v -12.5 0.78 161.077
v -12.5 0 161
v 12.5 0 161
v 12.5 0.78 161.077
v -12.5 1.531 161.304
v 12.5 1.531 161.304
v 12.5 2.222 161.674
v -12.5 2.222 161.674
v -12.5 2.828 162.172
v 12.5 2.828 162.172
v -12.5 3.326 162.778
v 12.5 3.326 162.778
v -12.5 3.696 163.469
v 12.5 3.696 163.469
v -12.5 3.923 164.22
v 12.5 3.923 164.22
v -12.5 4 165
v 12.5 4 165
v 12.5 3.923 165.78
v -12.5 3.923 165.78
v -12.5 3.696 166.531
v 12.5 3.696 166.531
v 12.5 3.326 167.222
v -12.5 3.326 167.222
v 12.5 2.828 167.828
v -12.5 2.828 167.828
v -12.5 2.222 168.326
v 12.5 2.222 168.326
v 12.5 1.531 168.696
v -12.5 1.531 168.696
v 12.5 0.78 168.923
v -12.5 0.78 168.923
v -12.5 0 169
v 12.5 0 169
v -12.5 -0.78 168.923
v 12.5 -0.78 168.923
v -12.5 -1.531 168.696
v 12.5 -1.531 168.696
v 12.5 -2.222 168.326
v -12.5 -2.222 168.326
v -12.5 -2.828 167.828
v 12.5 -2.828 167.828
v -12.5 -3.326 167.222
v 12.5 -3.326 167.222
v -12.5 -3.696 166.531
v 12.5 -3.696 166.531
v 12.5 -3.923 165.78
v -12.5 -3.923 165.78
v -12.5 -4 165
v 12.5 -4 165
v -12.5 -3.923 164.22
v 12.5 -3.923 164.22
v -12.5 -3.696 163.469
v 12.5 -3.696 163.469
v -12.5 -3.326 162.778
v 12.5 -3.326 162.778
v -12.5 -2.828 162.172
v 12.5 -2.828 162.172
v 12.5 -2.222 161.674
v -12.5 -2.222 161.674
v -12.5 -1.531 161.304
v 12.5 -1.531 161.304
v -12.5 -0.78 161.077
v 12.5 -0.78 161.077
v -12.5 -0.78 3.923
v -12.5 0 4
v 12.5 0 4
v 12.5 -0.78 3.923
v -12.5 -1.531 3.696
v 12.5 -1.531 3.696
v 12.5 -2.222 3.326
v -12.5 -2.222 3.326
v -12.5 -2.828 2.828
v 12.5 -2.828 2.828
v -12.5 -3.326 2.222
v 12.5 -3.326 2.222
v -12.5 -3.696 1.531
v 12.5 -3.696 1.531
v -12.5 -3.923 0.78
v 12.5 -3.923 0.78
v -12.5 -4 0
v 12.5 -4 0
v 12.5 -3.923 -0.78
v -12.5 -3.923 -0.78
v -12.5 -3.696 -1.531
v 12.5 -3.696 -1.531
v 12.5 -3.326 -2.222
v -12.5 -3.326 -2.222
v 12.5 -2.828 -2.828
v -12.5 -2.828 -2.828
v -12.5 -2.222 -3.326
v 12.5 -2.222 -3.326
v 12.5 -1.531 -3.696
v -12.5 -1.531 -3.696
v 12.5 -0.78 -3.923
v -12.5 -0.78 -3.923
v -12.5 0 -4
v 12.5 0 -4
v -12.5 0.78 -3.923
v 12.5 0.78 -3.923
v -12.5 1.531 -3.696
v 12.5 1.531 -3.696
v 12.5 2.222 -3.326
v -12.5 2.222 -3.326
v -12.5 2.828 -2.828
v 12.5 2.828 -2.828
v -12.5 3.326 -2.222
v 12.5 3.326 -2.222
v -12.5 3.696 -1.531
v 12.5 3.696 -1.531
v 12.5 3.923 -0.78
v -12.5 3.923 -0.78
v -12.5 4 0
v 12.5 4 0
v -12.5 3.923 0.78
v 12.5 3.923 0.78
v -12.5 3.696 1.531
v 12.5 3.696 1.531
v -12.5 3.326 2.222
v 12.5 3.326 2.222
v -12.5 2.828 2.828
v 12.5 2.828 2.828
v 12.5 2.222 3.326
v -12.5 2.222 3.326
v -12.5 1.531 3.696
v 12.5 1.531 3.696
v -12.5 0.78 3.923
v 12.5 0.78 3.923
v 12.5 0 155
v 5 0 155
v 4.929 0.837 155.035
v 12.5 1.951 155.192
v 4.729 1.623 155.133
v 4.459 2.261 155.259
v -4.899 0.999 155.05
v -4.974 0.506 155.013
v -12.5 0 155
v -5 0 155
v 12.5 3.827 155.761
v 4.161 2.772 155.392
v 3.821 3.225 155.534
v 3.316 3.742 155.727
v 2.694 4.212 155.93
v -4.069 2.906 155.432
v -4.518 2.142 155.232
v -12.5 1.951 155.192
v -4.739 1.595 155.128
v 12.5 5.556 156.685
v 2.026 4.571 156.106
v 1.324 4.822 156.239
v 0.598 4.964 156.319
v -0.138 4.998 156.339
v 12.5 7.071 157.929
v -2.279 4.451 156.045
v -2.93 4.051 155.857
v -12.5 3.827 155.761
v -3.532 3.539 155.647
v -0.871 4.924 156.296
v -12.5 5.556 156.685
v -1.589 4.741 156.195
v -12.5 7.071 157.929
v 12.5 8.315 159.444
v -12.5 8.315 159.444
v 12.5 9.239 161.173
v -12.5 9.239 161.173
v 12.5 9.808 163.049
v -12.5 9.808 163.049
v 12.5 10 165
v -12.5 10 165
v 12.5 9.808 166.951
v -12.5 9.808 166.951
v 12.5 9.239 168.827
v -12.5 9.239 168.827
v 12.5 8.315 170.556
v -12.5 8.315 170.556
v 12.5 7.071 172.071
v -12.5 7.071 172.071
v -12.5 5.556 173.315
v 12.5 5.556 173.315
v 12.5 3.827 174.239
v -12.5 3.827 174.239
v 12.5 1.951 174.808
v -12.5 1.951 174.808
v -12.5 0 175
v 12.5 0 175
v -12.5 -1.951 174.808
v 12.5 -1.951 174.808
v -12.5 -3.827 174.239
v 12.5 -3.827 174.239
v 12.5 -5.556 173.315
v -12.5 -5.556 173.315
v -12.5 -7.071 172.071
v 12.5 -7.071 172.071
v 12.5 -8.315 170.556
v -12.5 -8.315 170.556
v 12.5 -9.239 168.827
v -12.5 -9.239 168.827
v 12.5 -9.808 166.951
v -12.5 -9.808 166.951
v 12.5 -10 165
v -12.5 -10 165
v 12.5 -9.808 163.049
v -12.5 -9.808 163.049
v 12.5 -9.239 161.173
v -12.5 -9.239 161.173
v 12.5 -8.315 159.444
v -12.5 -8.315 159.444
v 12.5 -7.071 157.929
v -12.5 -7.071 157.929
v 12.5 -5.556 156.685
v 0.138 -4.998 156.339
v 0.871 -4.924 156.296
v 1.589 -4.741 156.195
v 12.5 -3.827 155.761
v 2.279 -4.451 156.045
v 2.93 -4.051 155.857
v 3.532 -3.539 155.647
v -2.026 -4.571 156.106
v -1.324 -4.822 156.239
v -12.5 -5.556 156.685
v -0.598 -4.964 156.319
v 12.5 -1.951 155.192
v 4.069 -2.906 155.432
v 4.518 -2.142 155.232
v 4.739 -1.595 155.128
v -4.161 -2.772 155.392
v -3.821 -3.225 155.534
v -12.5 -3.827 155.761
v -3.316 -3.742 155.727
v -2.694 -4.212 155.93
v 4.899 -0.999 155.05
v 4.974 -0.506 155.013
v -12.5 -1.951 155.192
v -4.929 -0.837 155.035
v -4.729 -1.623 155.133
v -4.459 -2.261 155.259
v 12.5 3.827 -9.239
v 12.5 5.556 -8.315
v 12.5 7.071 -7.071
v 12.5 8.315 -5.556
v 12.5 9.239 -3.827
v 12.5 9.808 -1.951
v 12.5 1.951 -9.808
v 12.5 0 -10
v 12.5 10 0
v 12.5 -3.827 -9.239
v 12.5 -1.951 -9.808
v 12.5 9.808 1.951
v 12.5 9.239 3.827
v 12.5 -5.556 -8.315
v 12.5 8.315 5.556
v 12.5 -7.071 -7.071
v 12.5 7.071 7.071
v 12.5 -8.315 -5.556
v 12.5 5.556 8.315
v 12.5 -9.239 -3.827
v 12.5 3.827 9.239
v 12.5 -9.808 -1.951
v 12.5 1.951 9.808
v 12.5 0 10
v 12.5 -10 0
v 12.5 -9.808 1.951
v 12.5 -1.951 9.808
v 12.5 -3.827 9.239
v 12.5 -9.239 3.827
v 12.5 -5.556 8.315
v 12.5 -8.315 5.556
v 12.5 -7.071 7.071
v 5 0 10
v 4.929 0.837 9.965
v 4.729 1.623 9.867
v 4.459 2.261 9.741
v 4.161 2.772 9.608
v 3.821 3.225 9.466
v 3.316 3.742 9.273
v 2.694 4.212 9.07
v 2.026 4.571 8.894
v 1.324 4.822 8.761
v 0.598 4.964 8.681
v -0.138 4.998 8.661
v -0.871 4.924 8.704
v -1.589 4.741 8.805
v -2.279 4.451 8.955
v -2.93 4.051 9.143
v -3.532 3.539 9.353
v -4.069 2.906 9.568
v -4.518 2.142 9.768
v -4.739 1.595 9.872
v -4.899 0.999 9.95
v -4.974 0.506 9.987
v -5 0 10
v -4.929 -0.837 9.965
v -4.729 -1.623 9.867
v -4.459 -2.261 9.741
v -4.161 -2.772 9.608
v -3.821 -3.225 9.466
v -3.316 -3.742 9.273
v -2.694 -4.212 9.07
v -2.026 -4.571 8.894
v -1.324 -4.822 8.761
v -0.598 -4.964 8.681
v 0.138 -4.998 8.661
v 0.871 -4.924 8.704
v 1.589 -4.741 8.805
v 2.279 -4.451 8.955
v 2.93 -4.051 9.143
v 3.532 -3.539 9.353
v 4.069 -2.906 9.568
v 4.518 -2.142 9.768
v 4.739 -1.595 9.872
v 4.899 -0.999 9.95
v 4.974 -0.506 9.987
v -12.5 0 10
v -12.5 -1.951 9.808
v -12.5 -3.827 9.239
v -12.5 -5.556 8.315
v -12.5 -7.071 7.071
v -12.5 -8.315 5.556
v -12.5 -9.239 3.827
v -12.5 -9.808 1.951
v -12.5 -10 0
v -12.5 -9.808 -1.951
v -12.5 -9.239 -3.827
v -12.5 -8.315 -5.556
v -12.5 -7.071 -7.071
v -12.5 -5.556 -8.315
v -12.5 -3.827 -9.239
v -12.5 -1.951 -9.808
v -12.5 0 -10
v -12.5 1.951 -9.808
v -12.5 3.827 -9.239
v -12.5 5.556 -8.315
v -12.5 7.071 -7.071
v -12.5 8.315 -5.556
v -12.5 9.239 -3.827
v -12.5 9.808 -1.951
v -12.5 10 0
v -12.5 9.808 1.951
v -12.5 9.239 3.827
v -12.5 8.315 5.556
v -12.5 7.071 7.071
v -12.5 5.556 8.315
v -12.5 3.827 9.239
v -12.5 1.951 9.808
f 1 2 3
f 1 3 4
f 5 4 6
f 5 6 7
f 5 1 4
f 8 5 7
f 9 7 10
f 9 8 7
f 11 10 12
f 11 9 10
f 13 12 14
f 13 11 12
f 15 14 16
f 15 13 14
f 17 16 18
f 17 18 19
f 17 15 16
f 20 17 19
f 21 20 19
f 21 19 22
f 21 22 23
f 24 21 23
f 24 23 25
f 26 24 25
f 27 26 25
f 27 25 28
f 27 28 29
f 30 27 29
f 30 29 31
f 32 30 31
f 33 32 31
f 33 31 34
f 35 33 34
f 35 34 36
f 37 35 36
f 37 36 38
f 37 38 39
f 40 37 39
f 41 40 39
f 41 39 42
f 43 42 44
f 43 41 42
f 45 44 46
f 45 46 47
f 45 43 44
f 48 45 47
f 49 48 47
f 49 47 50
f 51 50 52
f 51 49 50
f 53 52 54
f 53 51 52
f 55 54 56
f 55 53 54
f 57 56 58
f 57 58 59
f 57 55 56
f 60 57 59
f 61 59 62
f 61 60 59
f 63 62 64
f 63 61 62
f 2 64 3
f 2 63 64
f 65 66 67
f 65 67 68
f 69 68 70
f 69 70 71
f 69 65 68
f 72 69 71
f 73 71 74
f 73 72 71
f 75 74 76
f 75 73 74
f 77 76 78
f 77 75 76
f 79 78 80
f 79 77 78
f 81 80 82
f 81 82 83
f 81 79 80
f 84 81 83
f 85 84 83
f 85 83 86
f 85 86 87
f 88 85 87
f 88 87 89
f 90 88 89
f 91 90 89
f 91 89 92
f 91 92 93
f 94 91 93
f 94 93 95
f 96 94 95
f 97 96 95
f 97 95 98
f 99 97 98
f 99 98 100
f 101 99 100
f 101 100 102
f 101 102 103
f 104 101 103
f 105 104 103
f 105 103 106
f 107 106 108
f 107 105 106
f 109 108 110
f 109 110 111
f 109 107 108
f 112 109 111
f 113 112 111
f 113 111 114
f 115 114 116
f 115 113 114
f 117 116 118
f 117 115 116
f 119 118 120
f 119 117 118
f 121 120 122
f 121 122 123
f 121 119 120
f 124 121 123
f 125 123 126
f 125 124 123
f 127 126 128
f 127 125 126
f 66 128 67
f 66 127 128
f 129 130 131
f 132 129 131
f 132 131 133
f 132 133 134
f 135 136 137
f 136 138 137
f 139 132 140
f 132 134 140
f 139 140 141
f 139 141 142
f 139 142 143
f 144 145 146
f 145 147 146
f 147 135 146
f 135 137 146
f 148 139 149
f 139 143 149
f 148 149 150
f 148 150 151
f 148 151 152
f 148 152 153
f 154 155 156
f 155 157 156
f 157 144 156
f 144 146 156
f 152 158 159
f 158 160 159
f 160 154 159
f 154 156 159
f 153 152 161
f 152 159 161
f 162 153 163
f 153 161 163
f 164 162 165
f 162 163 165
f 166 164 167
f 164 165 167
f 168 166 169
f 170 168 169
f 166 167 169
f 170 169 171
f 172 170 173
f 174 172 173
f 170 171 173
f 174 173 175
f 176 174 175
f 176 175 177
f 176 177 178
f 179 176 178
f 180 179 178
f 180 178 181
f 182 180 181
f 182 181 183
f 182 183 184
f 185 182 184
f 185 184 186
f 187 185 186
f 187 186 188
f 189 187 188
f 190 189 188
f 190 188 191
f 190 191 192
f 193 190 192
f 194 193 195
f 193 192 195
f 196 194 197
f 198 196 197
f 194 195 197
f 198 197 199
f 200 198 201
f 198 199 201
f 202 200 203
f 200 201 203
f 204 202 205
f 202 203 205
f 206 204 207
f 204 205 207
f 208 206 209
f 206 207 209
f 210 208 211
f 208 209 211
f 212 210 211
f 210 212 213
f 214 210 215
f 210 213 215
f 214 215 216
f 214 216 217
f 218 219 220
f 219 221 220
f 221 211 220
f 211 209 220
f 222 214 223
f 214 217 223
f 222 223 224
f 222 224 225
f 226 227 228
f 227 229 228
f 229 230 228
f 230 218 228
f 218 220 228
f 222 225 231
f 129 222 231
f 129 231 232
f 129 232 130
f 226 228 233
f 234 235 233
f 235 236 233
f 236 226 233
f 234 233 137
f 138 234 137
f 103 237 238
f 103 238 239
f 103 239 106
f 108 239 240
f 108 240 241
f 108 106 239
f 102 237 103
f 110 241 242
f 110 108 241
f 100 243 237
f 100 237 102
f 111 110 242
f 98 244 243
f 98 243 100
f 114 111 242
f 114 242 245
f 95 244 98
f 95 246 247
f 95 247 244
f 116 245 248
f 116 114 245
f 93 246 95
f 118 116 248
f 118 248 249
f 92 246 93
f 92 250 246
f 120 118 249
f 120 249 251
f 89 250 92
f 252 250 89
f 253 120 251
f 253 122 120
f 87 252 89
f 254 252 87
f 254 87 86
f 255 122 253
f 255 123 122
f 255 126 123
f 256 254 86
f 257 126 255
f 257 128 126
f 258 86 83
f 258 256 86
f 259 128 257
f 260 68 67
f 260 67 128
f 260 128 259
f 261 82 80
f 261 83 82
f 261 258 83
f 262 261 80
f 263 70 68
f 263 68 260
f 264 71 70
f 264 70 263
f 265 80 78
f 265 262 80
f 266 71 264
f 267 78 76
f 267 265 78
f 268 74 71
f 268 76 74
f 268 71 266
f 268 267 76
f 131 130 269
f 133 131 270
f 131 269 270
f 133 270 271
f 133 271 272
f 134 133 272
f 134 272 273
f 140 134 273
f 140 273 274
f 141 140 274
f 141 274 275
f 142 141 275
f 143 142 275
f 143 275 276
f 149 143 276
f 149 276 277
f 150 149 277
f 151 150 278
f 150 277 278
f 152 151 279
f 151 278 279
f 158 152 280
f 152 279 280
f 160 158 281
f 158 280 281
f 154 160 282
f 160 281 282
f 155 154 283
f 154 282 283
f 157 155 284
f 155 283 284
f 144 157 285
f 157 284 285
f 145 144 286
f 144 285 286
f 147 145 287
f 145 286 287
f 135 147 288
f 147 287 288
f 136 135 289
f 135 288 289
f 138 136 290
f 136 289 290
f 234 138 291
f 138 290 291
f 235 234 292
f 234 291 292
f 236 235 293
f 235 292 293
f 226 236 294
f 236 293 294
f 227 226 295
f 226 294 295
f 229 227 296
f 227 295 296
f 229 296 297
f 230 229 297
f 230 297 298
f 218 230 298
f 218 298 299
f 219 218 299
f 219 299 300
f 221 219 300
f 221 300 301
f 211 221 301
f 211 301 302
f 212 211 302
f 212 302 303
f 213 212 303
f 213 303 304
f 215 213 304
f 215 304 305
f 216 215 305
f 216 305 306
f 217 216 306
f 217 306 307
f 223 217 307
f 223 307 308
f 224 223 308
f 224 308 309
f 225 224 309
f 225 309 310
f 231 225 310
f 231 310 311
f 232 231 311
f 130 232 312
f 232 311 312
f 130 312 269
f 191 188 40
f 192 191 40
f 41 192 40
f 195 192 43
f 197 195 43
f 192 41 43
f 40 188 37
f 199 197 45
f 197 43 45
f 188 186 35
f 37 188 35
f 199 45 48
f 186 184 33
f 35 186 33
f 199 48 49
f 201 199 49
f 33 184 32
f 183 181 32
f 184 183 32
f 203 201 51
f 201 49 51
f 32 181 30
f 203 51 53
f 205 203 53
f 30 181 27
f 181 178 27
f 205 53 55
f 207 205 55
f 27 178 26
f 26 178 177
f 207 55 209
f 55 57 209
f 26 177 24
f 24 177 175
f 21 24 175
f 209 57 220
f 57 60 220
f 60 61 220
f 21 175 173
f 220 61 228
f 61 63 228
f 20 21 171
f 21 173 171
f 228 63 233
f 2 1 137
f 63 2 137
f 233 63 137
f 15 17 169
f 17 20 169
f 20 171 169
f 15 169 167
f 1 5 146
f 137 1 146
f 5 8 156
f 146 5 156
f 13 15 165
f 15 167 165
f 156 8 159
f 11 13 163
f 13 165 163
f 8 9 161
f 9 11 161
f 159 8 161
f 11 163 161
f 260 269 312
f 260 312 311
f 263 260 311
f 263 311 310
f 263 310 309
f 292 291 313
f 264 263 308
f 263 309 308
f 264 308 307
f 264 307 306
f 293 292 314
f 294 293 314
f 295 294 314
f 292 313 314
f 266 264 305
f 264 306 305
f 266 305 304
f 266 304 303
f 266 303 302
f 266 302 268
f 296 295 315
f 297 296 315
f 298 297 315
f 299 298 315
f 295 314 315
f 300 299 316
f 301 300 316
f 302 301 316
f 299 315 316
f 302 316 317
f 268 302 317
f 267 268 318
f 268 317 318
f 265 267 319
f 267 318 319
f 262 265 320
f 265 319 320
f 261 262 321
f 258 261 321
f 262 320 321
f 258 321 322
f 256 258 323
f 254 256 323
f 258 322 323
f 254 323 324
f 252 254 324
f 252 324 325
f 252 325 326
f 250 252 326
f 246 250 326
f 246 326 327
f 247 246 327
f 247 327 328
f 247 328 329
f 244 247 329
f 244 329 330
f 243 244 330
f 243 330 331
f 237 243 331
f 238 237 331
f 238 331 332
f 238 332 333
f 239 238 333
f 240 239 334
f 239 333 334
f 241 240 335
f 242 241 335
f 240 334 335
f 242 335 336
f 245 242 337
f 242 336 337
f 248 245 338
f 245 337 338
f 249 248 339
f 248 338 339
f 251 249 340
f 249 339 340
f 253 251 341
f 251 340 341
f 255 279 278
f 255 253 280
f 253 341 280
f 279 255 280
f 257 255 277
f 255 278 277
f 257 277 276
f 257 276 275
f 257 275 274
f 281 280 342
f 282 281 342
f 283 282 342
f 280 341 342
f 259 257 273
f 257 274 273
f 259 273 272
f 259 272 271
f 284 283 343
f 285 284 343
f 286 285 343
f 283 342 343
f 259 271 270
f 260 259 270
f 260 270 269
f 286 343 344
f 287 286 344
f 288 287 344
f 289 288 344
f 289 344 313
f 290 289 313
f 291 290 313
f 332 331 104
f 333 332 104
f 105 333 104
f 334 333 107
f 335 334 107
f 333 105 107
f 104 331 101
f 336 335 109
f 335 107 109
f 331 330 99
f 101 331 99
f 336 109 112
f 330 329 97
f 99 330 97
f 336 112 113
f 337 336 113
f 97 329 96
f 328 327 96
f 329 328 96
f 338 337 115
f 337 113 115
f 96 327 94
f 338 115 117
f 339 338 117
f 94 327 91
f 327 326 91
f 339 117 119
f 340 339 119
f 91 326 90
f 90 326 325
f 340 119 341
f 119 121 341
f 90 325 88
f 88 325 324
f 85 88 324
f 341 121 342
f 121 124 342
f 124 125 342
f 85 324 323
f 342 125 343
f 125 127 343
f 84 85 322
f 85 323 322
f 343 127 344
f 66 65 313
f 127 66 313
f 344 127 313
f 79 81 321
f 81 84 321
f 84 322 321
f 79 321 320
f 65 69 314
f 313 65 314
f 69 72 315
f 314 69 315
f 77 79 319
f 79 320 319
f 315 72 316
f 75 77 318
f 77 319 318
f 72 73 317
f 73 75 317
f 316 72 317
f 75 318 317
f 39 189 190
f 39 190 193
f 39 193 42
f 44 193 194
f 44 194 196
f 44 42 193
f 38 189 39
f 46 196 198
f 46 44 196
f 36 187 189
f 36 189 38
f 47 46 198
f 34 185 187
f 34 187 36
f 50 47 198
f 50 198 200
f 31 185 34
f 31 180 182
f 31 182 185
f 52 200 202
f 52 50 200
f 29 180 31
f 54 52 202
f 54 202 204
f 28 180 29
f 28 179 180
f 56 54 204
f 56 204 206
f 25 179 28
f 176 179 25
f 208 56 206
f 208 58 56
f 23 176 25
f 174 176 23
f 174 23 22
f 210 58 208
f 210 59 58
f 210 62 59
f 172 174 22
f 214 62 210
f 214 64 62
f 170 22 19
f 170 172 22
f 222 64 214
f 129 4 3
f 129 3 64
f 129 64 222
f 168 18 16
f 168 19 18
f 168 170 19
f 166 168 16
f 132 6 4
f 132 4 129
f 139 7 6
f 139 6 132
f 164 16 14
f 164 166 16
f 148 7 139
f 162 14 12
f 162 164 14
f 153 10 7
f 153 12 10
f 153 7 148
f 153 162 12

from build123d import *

# Parameters (mm, degrees)
SKETCH1_R                = 5
BOSS_EXTRUDE1_DEPTH      = 165
BOSS_EXTRUDE2_DEPTH      = 12.5
BOSS_EXTRUDE2_DEPTH_BACK = 12.5
SKETCH2_R                = 10
SKETCH2_R_2              = 4
CUT_EXTRUDE1_DEPTH       = 176.73061782
CUT_EXTRUDE1_DEPTH_BACK  = 176.73061782
SKETCH2_2_R              = 4


with BuildPart() as part:
    # Sketch1 → Boss-Extrude1 (new body)
    with BuildSketch(Plane.XY):
        Circle(SKETCH1_R)
    extrude(amount=BOSS_EXTRUDE1_DEPTH)

    # Sketch2 → Boss-Extrude2 (add, two sides: drawn at the far end of the back side and taken through both)
    # profile 1 of 2: a face of its own
    with BuildSketch(Plane(origin=(0, 0, 0), x_dir=(0, 0, -1), z_dir=(1, 0, 0)).offset(-BOSS_EXTRUDE2_DEPTH_BACK)):
        with Locations((-165, 0)):
            Circle(SKETCH2_R)
        with Locations((-165, 0)):
            Circle(SKETCH2_R_2, mode=Mode.SUBTRACT)
    # profile 2 of 2: a face of its own
    with BuildSketch(Plane(origin=(0, 0, 0), x_dir=(0, 0, -1), z_dir=(1, 0, 0)).offset(-BOSS_EXTRUDE2_DEPTH_BACK)):
        Circle(SKETCH2_R)
        Circle(SKETCH2_R_2, mode=Mode.SUBTRACT)
    extrude(amount=BOSS_EXTRUDE2_DEPTH + BOSS_EXTRUDE2_DEPTH_BACK)

    # Sketch2<2> → Cut-Extrude1 (cut, two sides: drawn at the far end of the back side and taken through both)
    with BuildSketch(Plane(origin=(0, 0, 0), x_dir=(0, 0, -1), z_dir=(1, 0, 0)).offset(-CUT_EXTRUDE1_DEPTH_BACK)):
        with Locations((-165, 0)):
            Circle(SKETCH2_2_R)
        Circle(SKETCH2_2_R)
    extrude(amount=CUT_EXTRUDE1_DEPTH + CUT_EXTRUDE1_DEPTH_BACK, mode=Mode.SUBTRACT)


solid = part.part
